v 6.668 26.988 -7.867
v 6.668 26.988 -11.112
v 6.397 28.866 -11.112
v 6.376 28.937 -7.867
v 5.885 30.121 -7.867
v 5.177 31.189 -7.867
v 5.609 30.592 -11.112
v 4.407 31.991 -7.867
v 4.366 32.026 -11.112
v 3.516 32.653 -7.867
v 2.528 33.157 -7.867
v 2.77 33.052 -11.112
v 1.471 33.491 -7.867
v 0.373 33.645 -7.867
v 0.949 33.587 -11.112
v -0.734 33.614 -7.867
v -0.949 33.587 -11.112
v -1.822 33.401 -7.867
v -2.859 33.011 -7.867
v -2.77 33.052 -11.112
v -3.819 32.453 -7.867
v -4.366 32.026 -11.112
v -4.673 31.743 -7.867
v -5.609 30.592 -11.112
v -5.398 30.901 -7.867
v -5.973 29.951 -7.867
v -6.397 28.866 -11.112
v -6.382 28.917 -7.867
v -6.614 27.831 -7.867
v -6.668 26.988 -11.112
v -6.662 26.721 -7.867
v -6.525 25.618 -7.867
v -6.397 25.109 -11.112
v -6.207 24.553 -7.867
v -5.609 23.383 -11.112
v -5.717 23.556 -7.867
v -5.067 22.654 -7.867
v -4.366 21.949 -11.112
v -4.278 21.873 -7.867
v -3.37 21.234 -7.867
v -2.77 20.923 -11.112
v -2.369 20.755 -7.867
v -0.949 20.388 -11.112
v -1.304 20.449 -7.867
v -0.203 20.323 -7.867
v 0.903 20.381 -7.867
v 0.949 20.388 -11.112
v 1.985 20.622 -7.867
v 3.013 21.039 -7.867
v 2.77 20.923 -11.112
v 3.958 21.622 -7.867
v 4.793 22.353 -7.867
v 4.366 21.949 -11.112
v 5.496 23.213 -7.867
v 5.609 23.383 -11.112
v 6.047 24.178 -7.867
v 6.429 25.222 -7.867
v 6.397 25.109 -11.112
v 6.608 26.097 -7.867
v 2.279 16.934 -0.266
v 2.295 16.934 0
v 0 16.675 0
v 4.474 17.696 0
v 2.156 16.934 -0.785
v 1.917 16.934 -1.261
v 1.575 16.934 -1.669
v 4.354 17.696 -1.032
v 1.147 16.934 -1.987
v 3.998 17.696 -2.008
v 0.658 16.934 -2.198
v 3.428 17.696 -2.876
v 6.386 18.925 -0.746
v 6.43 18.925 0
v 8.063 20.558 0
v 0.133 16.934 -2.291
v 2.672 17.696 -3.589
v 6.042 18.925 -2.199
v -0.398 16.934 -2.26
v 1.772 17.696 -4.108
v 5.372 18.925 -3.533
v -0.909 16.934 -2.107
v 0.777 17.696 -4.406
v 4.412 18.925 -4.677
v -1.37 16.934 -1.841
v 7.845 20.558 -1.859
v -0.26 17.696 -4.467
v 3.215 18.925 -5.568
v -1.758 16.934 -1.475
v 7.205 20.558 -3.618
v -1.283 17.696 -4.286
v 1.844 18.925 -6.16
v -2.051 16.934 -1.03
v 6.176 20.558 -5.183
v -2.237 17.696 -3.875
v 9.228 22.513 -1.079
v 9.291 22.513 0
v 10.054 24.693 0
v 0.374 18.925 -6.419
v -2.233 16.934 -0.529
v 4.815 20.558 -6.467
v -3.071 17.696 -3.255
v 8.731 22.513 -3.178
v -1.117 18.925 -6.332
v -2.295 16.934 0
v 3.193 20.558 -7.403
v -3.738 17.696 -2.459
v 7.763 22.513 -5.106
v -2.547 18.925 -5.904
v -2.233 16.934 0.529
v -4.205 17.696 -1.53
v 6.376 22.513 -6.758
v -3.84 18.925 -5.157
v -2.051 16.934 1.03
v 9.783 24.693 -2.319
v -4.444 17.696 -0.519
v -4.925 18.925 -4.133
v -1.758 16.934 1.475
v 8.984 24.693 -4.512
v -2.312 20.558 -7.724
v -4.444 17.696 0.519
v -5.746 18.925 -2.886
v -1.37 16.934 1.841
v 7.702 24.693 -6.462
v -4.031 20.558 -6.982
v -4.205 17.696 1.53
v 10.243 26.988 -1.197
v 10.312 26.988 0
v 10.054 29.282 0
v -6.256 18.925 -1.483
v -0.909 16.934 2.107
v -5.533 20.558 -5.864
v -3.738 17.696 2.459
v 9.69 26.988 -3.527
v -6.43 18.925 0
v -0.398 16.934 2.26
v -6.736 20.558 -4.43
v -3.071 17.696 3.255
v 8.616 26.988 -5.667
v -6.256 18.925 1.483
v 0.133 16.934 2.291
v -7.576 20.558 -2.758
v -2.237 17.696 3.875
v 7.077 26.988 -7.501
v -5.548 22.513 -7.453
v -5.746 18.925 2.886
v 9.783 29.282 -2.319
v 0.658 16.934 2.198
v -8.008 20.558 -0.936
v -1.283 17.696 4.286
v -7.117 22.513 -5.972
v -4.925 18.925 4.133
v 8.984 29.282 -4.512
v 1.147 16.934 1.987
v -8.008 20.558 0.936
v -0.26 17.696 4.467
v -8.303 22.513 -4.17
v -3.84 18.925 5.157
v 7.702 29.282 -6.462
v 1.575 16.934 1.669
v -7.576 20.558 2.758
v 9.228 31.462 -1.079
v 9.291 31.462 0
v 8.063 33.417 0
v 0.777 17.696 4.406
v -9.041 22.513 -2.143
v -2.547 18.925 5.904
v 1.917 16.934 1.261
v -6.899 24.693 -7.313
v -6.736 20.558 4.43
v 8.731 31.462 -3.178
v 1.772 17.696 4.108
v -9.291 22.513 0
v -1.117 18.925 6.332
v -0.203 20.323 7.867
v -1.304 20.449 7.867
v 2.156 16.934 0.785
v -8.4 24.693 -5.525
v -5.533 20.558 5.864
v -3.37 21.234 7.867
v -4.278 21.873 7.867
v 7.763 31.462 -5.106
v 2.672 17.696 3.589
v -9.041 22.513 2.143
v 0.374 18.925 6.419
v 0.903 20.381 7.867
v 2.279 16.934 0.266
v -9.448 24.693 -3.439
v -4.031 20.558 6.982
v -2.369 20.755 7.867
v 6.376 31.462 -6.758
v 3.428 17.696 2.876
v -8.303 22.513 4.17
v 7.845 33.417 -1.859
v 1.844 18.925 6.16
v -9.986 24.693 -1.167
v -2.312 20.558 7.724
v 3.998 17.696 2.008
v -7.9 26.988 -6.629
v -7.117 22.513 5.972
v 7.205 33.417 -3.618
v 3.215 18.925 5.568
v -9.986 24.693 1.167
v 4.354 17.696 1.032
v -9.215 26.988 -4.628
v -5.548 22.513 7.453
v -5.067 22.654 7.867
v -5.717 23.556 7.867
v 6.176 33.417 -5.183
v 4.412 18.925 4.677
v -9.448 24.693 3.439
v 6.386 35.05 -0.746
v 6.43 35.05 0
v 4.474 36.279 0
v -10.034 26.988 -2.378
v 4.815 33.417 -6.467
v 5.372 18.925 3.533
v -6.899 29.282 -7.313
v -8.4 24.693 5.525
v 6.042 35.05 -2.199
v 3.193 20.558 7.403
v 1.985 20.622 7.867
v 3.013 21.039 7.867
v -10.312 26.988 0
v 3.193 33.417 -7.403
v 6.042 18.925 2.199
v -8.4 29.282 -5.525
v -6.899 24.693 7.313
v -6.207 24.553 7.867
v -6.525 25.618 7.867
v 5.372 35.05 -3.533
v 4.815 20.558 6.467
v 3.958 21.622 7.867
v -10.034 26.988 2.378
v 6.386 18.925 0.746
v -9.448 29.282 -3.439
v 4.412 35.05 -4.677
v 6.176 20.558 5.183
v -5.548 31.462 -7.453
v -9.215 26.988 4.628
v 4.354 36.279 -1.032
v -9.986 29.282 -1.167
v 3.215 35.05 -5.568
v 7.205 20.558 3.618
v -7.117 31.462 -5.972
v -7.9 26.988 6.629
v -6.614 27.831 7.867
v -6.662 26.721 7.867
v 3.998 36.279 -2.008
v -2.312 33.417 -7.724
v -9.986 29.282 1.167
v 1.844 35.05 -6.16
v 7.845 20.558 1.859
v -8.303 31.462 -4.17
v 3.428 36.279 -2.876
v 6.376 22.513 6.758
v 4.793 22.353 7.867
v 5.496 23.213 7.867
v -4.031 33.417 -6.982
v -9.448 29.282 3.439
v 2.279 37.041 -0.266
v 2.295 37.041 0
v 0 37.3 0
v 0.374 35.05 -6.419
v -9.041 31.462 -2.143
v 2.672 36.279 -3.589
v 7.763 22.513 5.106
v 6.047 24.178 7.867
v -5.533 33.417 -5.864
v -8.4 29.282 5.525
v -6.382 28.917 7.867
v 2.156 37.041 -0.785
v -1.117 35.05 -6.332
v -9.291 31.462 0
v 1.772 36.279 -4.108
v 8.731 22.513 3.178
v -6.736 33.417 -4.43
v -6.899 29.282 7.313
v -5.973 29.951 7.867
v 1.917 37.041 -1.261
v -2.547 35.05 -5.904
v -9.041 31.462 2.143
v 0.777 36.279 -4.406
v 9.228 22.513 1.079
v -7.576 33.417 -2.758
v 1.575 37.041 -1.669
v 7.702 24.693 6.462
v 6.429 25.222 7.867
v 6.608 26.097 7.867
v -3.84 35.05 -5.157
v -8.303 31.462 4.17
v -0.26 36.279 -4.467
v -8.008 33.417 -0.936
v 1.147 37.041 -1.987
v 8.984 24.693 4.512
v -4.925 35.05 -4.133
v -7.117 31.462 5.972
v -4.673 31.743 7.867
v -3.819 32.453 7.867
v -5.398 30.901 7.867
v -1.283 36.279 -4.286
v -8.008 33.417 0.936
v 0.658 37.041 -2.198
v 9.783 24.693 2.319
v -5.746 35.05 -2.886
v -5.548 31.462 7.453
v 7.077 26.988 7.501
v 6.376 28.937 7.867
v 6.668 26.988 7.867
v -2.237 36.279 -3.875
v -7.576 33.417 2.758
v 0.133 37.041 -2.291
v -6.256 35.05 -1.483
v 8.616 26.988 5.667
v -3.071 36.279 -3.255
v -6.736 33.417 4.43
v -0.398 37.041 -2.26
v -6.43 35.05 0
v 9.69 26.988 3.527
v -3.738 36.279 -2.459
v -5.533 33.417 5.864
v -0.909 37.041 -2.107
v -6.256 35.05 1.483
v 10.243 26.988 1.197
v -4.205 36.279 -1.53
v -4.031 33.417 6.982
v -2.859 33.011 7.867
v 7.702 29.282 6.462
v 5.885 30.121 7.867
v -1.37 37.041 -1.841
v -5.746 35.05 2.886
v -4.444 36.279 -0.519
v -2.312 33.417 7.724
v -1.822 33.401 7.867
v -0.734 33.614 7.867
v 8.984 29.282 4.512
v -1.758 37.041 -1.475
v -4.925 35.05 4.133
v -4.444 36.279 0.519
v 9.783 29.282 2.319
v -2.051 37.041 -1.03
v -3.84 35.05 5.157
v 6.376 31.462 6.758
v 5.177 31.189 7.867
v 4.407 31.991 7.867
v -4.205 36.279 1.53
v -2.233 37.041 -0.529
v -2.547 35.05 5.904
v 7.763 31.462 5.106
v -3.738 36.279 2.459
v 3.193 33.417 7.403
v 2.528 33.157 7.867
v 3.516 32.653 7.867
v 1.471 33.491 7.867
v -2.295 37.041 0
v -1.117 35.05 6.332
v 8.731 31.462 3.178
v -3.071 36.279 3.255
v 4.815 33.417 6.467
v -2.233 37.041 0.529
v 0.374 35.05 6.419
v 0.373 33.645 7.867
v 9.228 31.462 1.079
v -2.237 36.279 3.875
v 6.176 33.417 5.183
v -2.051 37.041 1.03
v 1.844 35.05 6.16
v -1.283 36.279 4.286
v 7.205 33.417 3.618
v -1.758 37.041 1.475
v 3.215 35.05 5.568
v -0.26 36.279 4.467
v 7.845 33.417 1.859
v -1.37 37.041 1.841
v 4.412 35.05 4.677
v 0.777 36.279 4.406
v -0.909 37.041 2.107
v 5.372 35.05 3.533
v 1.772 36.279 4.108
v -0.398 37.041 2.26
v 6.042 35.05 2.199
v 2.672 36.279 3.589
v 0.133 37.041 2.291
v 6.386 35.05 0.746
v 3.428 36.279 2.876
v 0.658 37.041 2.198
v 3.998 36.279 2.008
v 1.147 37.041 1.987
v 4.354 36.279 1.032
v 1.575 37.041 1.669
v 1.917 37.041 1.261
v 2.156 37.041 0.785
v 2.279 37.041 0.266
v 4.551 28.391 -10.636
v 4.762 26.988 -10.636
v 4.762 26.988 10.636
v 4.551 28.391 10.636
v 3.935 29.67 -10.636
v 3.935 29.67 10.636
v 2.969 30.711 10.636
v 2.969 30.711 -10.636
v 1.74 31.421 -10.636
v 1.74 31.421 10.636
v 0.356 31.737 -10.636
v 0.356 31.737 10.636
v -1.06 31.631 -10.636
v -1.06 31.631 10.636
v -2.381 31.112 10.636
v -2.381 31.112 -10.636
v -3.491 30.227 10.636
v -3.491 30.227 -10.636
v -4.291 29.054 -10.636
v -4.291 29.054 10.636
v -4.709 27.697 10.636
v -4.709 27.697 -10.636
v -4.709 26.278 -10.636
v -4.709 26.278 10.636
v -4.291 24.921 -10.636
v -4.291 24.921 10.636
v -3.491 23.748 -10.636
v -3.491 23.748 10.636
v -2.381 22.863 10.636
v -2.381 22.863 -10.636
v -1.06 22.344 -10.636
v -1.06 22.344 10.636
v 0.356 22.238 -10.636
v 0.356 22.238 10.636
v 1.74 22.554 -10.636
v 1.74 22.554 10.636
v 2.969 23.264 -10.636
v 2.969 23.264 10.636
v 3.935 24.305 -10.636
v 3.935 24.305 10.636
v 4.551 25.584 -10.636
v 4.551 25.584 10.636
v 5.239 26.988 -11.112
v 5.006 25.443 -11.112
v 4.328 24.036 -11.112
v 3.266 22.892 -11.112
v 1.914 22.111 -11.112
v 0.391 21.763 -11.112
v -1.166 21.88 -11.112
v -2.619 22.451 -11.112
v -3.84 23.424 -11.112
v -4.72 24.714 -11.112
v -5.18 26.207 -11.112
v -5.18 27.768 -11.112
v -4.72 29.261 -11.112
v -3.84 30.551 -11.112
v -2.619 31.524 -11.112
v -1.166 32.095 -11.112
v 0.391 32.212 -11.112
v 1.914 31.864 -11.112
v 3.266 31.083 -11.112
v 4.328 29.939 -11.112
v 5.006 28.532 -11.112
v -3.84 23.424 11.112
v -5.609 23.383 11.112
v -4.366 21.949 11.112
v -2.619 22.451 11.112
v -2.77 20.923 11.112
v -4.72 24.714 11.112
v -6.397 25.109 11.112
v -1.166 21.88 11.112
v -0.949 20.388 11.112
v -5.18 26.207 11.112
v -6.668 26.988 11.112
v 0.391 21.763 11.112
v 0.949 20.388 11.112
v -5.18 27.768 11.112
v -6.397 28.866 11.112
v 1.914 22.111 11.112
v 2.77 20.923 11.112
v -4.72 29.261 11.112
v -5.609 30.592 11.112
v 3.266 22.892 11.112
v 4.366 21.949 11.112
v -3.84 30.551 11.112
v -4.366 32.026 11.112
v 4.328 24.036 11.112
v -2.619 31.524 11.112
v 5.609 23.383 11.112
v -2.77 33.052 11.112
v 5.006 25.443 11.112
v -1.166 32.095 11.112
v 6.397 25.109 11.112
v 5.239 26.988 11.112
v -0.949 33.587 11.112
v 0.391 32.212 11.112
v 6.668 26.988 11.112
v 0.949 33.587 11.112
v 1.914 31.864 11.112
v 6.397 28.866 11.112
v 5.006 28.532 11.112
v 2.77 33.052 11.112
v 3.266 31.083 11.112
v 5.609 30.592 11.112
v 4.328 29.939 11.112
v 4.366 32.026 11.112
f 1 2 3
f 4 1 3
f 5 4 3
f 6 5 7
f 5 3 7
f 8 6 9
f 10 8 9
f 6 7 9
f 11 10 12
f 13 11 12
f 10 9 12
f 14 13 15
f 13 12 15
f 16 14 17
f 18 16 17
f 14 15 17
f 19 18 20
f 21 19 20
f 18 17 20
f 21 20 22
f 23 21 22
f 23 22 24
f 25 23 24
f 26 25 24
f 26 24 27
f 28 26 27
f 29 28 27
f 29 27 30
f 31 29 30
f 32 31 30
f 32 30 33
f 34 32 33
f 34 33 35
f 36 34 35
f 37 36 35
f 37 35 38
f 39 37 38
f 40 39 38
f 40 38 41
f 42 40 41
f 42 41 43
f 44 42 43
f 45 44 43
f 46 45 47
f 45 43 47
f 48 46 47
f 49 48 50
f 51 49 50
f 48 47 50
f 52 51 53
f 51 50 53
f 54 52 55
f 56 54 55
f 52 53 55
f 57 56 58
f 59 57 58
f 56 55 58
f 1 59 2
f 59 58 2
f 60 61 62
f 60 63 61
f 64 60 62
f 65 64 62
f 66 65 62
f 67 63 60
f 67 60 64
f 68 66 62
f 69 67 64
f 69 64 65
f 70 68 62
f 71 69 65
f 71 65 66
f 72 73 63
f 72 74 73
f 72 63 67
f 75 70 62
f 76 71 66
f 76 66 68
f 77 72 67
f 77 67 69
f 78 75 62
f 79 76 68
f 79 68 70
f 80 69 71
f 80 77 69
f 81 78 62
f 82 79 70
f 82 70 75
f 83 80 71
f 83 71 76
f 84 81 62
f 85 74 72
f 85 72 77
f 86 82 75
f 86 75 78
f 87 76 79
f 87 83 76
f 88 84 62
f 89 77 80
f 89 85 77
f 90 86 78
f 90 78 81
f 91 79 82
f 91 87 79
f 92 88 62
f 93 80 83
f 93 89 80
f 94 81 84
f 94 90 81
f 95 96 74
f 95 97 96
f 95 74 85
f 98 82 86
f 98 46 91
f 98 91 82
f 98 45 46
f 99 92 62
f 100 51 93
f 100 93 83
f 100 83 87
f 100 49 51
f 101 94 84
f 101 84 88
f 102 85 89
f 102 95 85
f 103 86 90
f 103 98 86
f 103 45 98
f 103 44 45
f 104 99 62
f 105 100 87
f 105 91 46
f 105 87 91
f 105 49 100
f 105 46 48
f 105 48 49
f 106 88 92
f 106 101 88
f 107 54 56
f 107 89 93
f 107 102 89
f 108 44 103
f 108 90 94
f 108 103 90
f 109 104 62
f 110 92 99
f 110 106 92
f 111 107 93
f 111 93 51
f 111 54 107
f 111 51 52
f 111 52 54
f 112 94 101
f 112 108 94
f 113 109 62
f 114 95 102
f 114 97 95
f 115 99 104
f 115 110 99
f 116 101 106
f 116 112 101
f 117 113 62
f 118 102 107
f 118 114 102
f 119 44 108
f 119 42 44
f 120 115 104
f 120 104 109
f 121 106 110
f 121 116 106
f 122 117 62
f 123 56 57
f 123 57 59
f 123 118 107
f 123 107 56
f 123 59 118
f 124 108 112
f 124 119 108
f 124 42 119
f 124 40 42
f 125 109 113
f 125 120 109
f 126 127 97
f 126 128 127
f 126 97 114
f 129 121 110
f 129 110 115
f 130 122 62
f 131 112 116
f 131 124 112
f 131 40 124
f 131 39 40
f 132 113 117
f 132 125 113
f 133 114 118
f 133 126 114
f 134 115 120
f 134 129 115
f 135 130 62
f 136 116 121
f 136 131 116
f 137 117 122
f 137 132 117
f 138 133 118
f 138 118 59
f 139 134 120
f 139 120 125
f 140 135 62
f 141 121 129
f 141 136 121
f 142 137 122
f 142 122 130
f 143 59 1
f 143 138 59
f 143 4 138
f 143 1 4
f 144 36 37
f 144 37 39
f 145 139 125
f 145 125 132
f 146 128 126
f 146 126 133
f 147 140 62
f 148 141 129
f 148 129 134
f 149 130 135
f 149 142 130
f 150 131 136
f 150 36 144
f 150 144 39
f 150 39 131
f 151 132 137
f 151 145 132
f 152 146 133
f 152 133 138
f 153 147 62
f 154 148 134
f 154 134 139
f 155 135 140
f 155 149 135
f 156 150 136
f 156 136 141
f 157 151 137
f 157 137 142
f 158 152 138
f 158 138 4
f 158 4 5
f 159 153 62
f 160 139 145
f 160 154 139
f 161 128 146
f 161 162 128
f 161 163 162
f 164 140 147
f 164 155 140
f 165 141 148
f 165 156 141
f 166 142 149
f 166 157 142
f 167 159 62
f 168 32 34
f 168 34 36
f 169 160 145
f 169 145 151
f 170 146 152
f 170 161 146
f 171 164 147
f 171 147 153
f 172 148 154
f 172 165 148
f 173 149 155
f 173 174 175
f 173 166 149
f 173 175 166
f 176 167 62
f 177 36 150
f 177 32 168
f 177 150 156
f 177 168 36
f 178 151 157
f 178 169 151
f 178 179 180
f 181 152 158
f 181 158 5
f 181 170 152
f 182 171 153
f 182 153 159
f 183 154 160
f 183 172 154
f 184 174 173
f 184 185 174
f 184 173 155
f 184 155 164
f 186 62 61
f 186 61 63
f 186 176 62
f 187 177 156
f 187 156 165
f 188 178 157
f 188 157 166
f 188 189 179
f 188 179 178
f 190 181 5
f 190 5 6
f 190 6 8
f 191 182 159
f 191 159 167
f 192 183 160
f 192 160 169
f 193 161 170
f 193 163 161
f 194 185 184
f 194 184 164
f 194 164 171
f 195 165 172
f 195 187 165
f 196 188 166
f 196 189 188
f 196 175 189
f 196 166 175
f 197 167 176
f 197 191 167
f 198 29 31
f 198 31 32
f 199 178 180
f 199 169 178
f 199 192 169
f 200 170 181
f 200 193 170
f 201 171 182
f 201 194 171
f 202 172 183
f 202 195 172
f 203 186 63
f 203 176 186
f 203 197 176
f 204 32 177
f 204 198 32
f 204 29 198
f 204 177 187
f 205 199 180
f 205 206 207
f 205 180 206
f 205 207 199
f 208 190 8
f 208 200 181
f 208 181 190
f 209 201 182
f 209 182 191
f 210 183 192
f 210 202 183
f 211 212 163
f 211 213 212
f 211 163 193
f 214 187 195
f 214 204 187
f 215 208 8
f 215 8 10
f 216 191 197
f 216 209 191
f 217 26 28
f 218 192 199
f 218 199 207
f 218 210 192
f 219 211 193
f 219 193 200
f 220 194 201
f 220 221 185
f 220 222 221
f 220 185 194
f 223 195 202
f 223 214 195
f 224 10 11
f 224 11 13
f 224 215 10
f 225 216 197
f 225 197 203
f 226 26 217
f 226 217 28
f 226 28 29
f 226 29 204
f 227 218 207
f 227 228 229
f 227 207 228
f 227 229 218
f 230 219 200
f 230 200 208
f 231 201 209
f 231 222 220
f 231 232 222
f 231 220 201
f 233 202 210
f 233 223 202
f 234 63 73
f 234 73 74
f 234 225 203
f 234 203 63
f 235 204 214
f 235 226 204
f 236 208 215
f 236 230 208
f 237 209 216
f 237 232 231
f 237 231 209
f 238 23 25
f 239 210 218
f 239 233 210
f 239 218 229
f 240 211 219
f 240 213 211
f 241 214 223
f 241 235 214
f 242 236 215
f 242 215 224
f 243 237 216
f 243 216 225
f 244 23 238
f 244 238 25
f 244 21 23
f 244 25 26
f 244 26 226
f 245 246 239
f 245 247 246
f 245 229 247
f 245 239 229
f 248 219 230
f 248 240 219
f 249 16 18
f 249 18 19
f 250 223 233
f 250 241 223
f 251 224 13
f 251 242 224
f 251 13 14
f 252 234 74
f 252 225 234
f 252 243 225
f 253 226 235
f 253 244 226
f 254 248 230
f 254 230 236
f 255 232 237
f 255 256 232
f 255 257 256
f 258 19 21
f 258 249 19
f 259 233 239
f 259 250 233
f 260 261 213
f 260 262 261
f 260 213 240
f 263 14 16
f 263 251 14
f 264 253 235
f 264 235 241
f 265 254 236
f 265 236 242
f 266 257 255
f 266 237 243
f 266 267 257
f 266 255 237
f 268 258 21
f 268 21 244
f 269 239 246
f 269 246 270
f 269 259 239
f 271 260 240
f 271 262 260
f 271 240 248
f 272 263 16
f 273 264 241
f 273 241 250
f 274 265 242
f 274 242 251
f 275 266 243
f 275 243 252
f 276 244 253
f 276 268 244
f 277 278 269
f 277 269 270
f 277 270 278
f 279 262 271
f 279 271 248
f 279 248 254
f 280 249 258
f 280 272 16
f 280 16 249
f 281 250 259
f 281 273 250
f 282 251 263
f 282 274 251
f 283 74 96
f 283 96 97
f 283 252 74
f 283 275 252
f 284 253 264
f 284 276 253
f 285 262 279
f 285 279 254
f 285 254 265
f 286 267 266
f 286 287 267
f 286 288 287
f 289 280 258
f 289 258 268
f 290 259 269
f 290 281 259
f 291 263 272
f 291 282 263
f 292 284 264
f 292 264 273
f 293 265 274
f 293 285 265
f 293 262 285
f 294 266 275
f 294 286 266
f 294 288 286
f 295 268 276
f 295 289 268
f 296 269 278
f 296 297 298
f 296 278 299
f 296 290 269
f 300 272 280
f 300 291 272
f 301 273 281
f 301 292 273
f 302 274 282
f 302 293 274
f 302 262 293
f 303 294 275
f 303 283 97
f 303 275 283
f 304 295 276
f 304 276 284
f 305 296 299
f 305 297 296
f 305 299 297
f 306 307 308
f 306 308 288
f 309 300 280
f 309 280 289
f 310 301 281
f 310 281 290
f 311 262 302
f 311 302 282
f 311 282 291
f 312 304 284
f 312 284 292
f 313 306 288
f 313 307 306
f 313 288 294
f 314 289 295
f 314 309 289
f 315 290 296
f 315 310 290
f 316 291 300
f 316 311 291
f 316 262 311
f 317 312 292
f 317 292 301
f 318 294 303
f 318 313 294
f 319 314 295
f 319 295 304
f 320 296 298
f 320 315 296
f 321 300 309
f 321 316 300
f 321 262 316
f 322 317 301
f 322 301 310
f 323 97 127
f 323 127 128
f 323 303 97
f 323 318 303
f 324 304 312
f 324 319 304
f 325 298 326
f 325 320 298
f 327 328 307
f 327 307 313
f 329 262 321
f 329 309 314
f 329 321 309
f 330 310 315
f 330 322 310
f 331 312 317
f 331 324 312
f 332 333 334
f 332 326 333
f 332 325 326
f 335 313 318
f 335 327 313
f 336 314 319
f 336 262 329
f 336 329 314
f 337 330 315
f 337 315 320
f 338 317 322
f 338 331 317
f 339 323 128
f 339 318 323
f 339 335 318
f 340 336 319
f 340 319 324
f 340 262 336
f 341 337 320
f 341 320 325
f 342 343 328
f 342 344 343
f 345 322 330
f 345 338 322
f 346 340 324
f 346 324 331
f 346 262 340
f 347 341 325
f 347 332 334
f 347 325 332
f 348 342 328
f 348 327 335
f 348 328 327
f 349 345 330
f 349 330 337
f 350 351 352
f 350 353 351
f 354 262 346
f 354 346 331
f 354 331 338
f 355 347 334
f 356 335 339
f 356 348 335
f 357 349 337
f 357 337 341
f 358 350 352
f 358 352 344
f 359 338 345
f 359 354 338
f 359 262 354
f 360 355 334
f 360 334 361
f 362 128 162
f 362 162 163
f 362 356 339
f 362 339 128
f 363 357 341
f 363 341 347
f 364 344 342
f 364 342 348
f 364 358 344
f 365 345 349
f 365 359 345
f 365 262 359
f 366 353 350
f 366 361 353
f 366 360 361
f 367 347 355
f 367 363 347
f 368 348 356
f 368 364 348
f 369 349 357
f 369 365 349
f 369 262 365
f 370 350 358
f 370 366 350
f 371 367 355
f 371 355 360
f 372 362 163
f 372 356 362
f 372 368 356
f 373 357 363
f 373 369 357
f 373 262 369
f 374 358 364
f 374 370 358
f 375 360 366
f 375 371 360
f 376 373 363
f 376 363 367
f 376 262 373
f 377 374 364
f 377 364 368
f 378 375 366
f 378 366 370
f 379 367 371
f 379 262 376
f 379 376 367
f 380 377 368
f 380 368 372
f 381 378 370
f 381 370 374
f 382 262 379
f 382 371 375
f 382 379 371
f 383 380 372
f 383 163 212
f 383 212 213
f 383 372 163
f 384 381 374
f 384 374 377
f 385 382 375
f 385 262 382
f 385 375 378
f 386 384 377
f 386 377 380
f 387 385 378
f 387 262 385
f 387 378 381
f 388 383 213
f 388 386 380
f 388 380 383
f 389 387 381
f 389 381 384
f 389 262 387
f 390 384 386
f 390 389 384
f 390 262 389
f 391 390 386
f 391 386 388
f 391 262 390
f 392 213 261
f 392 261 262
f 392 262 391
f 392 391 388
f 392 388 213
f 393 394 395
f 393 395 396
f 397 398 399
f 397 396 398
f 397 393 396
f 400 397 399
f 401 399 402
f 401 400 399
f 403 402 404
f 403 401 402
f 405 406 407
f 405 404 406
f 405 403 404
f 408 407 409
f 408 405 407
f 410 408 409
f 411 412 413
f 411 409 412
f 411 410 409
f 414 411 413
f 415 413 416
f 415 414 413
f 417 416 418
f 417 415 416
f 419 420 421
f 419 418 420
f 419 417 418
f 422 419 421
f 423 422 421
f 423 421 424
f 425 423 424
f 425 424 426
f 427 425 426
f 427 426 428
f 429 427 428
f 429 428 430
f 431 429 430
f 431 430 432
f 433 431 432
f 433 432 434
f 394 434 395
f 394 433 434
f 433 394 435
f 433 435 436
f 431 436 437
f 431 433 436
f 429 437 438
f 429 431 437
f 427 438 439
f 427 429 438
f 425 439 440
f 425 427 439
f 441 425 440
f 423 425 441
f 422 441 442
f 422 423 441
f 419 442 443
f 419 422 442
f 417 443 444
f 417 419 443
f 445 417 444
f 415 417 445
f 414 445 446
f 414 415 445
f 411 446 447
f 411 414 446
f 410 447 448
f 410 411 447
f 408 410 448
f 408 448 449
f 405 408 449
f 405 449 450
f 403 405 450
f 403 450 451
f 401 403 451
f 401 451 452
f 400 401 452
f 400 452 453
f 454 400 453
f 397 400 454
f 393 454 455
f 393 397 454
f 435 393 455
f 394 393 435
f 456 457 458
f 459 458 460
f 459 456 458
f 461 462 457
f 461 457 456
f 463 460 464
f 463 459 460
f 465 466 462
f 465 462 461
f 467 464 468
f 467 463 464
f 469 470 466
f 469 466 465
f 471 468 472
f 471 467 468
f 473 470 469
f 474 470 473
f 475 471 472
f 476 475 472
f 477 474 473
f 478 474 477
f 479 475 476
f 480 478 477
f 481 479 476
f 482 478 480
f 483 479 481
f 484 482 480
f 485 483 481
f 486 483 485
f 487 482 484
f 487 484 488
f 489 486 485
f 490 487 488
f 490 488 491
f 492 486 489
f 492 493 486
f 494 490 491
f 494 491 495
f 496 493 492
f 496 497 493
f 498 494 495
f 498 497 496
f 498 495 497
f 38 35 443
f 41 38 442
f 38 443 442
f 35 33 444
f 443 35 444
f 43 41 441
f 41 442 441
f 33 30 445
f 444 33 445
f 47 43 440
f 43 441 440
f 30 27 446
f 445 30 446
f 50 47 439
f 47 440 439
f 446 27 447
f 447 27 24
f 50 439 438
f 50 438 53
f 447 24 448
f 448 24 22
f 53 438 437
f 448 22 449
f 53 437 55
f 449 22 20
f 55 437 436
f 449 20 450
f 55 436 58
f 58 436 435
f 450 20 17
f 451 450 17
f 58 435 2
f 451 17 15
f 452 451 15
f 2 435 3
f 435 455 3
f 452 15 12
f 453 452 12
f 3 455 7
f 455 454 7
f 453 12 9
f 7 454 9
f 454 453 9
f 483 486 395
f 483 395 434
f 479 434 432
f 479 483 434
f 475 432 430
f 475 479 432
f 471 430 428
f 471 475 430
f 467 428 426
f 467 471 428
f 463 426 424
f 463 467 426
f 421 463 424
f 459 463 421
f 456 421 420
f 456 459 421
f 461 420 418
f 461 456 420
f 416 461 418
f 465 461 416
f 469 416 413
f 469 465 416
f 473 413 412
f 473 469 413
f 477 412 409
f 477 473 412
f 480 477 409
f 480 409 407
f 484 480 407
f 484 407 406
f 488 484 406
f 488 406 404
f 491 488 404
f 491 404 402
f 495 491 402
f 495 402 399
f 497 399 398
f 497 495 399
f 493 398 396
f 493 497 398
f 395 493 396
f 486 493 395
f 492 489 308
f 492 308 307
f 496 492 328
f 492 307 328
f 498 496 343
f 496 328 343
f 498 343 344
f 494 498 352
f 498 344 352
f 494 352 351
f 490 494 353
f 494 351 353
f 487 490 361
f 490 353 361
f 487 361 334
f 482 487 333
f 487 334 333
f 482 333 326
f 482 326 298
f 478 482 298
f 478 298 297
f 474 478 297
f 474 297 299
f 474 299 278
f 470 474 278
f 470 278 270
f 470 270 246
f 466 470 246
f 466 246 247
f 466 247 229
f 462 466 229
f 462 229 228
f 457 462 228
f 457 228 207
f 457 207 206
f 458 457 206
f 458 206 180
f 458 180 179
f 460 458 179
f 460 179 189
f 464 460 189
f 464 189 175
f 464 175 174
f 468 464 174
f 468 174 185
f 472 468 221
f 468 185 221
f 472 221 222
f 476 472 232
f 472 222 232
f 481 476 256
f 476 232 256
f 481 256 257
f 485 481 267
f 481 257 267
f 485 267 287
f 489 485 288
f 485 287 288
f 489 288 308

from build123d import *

# Parameters (mm, degrees)
EXTRUDE1_DEPTH          = 11.1125
EXTRUDE1_DEPTH_BACK     = 11.1125
SKETCH12_R              = 6.6675
CUT_EXTRUDE4_DEPTH      = 41.26308225
CUT_EXTRUDE4_DEPTH_BACK = 41.26308225
SKETCH10_R              = 4.7625
CHAMFER1_SIZE           = 0.47625


with BuildPart() as part:
    # Sketch7 → Revolve3 (revolve)
    with BuildSketch(Plane.XY):
        with BuildLine():
            Line((0, 37.2999), (0, 16.6751))
            ThreePointArc((0, 16.6751), (10.3124, 26.9875), (0, 37.2999))
        make_face()
    revolve(axis=Axis((0, 0, 0), (0, 1, 0)))

    # Sketch12 → Extrude1 (add, two sides: drawn at the far end of the back side and taken through both)
    with BuildSketch(Plane.XY.offset(-EXTRUDE1_DEPTH_BACK)):
        with Locations((0, 26.9875)):
            Circle(SKETCH12_R)
    extrude(amount=EXTRUDE1_DEPTH + EXTRUDE1_DEPTH_BACK)

    # Sketch10 → Cut-Extrude4 (cut, two sides: drawn at the far end of the back side and taken through both)
    with BuildSketch(Plane.XY.offset(-CUT_EXTRUDE4_DEPTH_BACK)):
        with Locations((0, 26.9875)):
            Circle(SKETCH10_R)
    extrude(amount=CUT_EXTRUDE4_DEPTH + CUT_EXTRUDE4_DEPTH_BACK, mode=Mode.SUBTRACT)

    # Chamfer1
    chamfer1_edges = [part.edges().sort_by_distance(p)[0] for p in [
        (-4.7625, 26.9875, -11.1125),
        (-4.7625, 26.9875, 11.1125),
    ]]
    chamfer(chamfer1_edges, length=CHAMFER1_SIZE)


solid = part.part
